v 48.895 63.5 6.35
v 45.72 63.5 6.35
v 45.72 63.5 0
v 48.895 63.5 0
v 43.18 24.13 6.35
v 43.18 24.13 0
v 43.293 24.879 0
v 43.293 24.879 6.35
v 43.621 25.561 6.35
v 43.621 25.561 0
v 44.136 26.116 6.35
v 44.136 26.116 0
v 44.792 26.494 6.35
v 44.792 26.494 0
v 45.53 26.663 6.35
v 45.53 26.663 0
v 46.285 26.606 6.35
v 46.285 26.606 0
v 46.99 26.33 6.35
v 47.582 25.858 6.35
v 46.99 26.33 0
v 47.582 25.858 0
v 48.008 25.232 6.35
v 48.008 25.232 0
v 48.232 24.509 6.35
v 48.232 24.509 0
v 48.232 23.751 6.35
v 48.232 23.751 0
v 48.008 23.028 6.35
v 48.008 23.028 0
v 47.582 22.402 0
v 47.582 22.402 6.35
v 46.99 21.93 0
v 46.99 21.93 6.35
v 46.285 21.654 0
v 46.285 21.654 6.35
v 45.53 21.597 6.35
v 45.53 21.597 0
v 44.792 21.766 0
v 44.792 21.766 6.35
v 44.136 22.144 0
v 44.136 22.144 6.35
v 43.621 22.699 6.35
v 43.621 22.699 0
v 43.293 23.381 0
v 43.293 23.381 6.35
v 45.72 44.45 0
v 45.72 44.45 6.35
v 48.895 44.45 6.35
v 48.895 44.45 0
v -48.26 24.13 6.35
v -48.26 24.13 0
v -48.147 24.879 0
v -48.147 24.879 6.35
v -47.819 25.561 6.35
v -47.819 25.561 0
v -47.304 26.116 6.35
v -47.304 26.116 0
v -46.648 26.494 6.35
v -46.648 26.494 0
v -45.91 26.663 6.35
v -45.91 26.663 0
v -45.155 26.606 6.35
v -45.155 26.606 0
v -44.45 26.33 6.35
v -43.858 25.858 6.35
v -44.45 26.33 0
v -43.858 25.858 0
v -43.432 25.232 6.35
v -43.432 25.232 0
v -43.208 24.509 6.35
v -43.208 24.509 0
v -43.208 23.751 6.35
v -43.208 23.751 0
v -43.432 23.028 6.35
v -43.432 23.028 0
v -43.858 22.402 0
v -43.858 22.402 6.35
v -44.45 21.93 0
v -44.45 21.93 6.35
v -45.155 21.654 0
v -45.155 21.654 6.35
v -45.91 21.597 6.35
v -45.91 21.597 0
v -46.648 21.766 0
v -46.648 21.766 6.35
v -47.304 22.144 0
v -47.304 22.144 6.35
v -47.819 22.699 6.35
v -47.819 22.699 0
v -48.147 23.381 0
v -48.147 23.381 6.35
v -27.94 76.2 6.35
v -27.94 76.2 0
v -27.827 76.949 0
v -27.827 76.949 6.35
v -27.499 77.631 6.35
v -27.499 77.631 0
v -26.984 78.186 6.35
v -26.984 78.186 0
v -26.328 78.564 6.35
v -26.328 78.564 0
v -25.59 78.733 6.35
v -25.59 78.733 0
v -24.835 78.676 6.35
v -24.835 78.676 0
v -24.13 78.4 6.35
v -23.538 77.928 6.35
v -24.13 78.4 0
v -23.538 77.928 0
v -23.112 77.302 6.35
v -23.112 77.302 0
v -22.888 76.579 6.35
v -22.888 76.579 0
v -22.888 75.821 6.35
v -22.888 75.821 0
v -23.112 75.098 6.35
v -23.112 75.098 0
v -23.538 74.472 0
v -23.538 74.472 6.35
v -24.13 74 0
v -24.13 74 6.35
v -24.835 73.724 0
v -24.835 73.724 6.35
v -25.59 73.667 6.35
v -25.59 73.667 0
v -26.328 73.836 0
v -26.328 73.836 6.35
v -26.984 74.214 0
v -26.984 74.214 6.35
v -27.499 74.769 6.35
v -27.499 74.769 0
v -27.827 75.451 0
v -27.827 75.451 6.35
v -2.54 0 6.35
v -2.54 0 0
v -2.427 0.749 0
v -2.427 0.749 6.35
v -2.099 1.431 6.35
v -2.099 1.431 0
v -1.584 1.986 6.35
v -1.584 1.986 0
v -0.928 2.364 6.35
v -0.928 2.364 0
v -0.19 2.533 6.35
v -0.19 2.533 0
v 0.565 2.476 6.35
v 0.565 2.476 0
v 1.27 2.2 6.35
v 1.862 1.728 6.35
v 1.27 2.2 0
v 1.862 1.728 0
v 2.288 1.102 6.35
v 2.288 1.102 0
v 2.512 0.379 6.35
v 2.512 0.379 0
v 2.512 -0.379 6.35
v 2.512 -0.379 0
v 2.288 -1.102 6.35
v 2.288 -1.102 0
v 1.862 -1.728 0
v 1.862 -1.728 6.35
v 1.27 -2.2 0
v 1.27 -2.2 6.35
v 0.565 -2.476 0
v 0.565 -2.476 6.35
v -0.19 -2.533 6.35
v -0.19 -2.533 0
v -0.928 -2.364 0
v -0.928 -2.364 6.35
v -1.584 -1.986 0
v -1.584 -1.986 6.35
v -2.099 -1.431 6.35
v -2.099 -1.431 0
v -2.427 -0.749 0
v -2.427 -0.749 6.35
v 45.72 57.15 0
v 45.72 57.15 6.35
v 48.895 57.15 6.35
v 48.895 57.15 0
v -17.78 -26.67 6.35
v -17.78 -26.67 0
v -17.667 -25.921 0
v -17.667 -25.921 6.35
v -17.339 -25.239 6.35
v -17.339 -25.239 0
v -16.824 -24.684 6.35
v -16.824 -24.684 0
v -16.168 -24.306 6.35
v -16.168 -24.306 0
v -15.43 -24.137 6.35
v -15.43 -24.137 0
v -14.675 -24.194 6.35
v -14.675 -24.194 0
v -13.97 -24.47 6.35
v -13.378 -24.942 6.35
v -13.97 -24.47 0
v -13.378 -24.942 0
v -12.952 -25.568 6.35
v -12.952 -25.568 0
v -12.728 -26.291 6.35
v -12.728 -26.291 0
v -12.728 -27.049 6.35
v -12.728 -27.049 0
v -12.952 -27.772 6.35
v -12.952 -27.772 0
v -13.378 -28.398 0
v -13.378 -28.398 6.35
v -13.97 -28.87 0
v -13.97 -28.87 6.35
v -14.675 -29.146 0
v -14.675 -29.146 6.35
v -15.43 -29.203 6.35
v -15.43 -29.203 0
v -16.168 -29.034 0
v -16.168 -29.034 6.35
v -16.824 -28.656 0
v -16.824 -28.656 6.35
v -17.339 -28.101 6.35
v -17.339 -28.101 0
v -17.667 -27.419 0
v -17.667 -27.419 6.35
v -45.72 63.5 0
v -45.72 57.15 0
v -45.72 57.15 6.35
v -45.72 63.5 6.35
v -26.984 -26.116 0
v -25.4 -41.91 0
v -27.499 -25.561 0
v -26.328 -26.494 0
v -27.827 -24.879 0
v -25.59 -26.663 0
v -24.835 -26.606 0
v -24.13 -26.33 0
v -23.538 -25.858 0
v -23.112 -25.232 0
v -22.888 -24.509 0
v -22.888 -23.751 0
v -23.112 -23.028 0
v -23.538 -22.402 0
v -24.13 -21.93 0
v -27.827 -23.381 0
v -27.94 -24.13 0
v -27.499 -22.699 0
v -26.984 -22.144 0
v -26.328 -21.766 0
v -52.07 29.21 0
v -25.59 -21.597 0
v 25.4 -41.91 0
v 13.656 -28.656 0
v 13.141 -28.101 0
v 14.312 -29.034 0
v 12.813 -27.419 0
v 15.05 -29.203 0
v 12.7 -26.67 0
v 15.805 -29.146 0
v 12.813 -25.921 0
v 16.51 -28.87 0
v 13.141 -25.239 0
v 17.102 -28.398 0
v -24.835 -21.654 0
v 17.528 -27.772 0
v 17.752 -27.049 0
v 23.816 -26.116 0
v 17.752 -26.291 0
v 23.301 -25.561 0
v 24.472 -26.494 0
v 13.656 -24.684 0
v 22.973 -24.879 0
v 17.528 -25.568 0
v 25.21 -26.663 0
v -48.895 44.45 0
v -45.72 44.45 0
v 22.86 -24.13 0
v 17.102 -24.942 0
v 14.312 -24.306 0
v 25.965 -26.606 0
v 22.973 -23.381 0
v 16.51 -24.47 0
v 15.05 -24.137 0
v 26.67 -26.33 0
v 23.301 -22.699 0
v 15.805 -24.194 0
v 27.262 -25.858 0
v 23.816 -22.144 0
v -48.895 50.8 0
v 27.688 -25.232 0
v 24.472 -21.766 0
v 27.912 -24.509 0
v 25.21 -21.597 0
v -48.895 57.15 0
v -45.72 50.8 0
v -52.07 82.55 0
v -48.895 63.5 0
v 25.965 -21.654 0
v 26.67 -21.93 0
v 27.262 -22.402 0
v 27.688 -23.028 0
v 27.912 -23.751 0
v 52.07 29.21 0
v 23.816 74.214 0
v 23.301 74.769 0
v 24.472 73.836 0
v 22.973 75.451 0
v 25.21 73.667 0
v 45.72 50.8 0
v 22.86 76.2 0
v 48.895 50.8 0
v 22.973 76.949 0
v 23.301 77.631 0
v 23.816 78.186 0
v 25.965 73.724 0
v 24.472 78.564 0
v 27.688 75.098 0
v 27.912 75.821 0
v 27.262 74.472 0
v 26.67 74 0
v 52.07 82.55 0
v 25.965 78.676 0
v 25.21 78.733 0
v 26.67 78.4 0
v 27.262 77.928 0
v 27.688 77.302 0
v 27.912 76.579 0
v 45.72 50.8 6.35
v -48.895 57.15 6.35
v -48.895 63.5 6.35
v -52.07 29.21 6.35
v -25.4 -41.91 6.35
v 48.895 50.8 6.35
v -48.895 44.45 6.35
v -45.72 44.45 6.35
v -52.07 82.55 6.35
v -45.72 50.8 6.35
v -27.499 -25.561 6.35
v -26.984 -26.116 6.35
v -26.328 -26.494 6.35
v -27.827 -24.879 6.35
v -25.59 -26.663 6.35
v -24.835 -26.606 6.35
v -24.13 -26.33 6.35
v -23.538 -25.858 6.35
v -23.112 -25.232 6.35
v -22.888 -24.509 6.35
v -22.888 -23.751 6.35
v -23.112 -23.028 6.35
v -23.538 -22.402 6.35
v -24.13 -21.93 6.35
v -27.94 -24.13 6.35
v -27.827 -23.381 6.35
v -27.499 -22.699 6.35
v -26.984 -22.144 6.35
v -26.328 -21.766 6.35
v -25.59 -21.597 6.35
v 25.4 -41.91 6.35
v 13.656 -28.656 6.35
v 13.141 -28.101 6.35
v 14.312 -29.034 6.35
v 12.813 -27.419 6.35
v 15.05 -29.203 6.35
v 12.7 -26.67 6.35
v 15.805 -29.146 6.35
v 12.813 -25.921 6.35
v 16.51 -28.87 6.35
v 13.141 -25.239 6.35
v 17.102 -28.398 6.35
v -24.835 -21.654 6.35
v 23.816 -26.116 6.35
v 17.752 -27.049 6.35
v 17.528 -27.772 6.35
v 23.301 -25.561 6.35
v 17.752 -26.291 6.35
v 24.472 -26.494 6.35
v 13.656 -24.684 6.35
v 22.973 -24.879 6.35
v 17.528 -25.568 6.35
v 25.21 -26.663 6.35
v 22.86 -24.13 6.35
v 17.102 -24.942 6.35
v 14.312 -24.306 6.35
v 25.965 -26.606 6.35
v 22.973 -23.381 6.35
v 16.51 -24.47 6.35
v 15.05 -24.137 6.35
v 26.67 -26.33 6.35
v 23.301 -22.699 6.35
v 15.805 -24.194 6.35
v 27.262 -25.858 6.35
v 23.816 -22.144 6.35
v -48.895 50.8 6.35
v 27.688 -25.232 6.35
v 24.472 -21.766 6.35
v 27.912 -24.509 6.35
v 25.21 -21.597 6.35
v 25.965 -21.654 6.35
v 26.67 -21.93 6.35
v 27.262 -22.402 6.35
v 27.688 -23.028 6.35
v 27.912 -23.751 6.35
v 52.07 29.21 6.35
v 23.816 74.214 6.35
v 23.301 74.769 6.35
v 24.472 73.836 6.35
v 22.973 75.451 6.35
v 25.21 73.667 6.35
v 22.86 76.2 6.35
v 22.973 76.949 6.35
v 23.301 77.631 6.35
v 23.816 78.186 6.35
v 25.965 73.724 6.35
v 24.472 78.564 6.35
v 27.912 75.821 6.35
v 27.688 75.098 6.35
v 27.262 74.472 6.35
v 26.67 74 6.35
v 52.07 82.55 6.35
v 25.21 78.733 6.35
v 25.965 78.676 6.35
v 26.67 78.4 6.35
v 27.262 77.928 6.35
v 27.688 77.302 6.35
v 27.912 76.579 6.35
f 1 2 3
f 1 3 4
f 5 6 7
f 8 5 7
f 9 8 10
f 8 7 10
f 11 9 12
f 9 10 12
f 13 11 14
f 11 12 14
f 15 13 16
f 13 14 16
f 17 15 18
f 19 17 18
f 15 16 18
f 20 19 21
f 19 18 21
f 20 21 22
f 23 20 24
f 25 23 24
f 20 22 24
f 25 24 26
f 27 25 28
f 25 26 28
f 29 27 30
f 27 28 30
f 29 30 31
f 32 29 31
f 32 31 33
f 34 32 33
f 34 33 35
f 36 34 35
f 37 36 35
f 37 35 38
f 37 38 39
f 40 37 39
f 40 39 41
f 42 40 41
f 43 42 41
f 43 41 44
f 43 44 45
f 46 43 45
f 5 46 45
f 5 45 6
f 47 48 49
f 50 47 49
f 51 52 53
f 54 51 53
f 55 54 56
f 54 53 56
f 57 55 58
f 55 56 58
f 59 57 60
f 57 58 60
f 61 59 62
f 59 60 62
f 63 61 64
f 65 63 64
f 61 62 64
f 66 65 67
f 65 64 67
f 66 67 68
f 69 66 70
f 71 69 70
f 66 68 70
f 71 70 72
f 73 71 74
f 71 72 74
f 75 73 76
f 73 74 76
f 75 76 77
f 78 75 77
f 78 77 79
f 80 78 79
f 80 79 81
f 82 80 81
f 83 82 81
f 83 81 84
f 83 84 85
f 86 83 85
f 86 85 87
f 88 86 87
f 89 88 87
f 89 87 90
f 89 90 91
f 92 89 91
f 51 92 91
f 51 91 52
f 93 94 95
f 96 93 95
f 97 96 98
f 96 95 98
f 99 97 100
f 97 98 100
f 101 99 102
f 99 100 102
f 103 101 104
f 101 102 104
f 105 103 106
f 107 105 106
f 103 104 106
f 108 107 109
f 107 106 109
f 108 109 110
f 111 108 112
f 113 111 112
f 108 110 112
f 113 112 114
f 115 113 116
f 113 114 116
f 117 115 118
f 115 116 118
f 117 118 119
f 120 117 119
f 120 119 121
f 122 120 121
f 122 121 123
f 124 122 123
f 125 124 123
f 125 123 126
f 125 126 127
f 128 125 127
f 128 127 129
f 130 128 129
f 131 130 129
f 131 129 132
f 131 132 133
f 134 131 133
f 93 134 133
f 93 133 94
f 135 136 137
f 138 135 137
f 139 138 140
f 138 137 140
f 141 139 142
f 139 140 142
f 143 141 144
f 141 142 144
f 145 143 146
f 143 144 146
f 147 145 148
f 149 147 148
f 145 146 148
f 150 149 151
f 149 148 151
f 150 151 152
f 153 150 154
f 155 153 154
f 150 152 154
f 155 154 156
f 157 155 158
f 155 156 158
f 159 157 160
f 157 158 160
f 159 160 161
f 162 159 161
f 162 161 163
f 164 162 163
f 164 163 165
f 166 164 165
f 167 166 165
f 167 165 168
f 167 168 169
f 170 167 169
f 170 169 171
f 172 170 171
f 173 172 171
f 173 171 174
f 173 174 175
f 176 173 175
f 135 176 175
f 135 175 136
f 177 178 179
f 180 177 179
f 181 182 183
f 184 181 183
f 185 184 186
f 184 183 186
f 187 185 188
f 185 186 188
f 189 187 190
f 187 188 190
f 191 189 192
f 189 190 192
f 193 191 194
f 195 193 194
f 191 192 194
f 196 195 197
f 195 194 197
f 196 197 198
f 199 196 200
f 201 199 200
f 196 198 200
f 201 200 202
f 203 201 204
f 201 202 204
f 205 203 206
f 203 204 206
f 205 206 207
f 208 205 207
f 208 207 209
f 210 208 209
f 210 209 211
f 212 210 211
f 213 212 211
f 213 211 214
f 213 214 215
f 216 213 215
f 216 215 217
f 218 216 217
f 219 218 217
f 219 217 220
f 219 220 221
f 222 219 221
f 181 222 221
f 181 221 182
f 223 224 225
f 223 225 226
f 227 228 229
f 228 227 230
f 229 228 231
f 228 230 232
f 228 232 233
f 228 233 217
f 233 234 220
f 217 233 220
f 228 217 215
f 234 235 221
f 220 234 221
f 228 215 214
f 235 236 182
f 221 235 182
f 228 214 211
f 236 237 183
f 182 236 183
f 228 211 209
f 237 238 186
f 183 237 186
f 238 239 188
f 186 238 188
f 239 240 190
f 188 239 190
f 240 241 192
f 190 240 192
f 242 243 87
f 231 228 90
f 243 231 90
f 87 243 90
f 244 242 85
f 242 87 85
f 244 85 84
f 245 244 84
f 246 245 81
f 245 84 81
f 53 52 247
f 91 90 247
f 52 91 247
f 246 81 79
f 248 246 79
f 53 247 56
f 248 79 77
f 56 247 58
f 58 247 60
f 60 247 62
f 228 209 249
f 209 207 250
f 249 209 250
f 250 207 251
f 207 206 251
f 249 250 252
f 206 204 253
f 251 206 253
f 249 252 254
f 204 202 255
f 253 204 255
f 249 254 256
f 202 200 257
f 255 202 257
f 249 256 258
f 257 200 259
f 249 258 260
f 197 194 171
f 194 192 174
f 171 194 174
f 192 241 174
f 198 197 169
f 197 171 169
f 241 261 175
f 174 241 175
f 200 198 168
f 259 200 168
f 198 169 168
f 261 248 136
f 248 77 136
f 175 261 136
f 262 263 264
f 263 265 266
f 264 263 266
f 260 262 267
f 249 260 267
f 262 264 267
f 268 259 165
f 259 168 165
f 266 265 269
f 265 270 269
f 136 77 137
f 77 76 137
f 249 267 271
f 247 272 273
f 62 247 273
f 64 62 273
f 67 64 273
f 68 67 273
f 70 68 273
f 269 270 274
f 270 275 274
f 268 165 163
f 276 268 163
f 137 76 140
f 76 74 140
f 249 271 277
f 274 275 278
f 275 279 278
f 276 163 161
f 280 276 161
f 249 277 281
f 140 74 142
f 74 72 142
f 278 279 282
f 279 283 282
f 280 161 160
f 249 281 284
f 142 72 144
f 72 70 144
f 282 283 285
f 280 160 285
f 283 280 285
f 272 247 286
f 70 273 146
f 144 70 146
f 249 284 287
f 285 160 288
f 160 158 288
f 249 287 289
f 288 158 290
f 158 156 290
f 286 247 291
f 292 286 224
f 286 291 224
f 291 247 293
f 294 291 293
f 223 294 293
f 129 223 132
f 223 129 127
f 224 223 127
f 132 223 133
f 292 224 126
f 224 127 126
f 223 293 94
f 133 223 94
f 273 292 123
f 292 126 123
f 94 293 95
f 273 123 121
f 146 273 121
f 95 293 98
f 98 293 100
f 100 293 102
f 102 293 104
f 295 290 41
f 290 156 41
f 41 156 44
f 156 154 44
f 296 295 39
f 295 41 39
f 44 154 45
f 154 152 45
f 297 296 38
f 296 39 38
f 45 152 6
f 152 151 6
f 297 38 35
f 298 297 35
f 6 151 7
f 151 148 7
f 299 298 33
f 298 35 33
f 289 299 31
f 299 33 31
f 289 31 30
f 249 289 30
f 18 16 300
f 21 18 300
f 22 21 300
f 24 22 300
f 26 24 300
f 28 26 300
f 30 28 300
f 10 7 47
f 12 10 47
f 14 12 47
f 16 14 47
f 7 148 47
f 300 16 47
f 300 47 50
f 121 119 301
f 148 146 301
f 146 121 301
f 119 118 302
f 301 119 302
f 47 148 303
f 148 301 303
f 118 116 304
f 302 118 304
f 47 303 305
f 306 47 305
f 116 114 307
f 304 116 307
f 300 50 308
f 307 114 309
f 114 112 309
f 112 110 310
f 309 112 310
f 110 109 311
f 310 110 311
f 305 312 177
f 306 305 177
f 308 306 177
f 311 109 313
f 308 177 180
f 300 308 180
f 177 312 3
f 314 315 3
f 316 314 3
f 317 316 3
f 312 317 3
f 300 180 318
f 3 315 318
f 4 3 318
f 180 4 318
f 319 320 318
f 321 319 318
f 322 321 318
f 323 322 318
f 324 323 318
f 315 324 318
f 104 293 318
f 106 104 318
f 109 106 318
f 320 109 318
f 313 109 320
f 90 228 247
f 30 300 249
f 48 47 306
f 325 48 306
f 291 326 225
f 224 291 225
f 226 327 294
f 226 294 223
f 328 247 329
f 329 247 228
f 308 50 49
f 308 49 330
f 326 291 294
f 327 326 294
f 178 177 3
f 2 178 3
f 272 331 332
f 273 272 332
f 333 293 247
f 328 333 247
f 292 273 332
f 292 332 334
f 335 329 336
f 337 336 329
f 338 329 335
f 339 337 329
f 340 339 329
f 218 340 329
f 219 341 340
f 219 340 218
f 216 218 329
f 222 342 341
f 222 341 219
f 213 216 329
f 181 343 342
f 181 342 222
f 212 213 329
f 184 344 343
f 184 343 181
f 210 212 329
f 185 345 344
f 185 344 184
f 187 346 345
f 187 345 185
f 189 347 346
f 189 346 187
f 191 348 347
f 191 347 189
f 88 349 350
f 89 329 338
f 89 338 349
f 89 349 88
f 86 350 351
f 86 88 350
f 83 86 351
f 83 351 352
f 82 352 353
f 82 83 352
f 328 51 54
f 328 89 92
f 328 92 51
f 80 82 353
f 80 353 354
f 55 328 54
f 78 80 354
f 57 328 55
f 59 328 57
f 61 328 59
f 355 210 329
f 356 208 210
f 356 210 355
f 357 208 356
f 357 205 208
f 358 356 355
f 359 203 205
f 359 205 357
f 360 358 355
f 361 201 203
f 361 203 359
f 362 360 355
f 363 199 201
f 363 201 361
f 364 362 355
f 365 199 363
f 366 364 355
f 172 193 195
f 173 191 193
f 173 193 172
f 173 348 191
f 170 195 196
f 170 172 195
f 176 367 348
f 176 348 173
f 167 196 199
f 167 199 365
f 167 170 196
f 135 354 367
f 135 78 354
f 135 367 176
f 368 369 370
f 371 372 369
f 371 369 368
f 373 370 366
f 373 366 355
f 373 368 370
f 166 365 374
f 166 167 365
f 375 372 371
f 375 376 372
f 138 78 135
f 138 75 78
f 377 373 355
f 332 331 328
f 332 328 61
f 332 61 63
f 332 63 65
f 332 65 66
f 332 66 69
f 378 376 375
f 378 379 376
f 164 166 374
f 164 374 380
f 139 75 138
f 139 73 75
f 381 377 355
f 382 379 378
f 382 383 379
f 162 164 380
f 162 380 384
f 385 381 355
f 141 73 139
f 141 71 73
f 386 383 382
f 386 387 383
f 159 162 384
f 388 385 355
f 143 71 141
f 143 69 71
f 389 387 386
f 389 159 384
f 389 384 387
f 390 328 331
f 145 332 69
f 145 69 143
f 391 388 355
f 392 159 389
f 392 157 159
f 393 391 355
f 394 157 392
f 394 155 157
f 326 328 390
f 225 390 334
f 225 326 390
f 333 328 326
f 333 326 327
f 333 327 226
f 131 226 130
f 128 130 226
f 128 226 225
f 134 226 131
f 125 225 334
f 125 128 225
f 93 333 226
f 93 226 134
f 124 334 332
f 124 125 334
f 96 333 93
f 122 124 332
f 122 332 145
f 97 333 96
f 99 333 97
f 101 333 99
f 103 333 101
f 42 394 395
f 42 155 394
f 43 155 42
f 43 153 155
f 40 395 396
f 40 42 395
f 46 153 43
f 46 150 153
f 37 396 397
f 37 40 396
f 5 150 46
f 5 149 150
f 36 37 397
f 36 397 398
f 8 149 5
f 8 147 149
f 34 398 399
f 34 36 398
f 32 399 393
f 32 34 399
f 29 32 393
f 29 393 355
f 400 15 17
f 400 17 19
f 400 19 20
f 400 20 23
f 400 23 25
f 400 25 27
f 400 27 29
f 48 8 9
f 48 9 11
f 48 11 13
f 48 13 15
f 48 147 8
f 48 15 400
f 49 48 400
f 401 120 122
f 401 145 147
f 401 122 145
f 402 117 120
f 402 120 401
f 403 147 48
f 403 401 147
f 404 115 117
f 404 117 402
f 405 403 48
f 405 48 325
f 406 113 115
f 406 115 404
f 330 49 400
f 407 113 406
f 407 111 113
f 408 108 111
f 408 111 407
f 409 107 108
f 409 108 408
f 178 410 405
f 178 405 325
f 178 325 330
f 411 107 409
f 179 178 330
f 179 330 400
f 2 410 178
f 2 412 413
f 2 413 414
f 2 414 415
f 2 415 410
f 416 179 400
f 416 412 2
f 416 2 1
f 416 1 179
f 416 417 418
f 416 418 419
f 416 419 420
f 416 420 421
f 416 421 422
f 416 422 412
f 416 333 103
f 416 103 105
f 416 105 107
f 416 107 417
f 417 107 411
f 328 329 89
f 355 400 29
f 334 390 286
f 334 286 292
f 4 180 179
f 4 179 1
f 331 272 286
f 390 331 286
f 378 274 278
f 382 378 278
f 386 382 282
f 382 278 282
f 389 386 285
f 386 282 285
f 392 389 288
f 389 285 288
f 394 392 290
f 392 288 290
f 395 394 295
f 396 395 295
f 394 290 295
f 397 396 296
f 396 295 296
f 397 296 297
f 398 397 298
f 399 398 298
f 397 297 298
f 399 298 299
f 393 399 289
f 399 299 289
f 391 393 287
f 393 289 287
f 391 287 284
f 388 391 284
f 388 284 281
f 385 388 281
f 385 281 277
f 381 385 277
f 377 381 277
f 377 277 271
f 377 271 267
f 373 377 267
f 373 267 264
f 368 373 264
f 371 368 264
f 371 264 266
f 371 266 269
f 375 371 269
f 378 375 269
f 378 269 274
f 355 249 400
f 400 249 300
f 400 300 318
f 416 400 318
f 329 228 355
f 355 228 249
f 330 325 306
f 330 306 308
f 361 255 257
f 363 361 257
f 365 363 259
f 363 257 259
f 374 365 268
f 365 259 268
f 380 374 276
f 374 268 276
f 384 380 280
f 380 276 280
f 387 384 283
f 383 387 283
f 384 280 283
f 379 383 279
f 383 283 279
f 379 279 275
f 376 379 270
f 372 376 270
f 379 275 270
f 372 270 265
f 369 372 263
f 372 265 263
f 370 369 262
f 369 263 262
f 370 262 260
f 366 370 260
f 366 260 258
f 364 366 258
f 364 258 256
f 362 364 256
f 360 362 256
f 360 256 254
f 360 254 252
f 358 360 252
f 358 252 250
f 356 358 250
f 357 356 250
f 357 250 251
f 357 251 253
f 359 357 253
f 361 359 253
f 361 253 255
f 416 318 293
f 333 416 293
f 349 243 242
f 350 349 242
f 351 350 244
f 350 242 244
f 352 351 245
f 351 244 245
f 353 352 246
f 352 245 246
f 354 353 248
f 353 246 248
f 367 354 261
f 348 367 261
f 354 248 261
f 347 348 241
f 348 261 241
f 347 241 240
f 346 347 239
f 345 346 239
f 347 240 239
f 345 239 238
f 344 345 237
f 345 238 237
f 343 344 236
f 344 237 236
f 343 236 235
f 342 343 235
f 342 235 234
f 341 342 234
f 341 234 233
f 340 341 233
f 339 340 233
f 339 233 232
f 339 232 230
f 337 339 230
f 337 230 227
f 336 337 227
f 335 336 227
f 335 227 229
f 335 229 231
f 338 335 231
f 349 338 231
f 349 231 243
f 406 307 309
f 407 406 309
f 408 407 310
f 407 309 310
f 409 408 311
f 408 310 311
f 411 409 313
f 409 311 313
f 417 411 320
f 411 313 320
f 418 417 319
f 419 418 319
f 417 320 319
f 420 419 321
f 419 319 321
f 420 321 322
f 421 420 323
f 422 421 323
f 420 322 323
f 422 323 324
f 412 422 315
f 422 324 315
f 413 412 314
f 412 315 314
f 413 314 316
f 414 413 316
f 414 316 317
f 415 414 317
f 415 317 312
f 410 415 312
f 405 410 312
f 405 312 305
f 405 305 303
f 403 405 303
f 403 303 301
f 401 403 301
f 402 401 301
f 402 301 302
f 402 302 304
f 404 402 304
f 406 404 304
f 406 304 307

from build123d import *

# Parameters (mm, degrees)
F1_DEPTH = 6.35
F3_D     = 5.08
F4_W     = 3.175
F4_H     = 6.35
F5_DEPTH = 25.4


with BuildPart() as f1:
    # F0 (on Top) → F1 (new body)
    with BuildSketch(Plane.XY):
        Polygon((52.07, 29.21), (52.07, 82.55), (-52.07, 82.55), (-52.07, 29.21), (-25.4, -41.91), (0, -41.91), (25.4, -41.91), align=None)
    extrude(amount=F1_DEPTH)

    # F3 (through all)
    with Locations(Plane.XY.offset(6.35)):
        with Locations((-15.24, -26.67), (15.24, -26.67), (0, 0), (-45.72, 24.13), (-25.4, -24.13), (25.4, -24.13), (45.72, 24.13), (25.4, 76.2), (-25.4, 76.2)):
            Hole(F3_D / 2)

    # F4 (on face) → F5 (cut)
    with BuildSketch(Plane.XY.offset(6.35)):
        with Locations((-47.3075, 60.325)):
            Rectangle(F4_W, F4_H)
        with Locations((47.3075, 60.325)):
            Rectangle(F4_W, F4_H)
        with Locations((-47.3075, 47.625)):
            Rectangle(F4_W, F4_H)
        with Locations((47.3075, 47.625)):
            Rectangle(F4_W, F4_H)
    extrude(amount=-F5_DEPTH, mode=Mode.SUBTRACT)


solid = f1.part
